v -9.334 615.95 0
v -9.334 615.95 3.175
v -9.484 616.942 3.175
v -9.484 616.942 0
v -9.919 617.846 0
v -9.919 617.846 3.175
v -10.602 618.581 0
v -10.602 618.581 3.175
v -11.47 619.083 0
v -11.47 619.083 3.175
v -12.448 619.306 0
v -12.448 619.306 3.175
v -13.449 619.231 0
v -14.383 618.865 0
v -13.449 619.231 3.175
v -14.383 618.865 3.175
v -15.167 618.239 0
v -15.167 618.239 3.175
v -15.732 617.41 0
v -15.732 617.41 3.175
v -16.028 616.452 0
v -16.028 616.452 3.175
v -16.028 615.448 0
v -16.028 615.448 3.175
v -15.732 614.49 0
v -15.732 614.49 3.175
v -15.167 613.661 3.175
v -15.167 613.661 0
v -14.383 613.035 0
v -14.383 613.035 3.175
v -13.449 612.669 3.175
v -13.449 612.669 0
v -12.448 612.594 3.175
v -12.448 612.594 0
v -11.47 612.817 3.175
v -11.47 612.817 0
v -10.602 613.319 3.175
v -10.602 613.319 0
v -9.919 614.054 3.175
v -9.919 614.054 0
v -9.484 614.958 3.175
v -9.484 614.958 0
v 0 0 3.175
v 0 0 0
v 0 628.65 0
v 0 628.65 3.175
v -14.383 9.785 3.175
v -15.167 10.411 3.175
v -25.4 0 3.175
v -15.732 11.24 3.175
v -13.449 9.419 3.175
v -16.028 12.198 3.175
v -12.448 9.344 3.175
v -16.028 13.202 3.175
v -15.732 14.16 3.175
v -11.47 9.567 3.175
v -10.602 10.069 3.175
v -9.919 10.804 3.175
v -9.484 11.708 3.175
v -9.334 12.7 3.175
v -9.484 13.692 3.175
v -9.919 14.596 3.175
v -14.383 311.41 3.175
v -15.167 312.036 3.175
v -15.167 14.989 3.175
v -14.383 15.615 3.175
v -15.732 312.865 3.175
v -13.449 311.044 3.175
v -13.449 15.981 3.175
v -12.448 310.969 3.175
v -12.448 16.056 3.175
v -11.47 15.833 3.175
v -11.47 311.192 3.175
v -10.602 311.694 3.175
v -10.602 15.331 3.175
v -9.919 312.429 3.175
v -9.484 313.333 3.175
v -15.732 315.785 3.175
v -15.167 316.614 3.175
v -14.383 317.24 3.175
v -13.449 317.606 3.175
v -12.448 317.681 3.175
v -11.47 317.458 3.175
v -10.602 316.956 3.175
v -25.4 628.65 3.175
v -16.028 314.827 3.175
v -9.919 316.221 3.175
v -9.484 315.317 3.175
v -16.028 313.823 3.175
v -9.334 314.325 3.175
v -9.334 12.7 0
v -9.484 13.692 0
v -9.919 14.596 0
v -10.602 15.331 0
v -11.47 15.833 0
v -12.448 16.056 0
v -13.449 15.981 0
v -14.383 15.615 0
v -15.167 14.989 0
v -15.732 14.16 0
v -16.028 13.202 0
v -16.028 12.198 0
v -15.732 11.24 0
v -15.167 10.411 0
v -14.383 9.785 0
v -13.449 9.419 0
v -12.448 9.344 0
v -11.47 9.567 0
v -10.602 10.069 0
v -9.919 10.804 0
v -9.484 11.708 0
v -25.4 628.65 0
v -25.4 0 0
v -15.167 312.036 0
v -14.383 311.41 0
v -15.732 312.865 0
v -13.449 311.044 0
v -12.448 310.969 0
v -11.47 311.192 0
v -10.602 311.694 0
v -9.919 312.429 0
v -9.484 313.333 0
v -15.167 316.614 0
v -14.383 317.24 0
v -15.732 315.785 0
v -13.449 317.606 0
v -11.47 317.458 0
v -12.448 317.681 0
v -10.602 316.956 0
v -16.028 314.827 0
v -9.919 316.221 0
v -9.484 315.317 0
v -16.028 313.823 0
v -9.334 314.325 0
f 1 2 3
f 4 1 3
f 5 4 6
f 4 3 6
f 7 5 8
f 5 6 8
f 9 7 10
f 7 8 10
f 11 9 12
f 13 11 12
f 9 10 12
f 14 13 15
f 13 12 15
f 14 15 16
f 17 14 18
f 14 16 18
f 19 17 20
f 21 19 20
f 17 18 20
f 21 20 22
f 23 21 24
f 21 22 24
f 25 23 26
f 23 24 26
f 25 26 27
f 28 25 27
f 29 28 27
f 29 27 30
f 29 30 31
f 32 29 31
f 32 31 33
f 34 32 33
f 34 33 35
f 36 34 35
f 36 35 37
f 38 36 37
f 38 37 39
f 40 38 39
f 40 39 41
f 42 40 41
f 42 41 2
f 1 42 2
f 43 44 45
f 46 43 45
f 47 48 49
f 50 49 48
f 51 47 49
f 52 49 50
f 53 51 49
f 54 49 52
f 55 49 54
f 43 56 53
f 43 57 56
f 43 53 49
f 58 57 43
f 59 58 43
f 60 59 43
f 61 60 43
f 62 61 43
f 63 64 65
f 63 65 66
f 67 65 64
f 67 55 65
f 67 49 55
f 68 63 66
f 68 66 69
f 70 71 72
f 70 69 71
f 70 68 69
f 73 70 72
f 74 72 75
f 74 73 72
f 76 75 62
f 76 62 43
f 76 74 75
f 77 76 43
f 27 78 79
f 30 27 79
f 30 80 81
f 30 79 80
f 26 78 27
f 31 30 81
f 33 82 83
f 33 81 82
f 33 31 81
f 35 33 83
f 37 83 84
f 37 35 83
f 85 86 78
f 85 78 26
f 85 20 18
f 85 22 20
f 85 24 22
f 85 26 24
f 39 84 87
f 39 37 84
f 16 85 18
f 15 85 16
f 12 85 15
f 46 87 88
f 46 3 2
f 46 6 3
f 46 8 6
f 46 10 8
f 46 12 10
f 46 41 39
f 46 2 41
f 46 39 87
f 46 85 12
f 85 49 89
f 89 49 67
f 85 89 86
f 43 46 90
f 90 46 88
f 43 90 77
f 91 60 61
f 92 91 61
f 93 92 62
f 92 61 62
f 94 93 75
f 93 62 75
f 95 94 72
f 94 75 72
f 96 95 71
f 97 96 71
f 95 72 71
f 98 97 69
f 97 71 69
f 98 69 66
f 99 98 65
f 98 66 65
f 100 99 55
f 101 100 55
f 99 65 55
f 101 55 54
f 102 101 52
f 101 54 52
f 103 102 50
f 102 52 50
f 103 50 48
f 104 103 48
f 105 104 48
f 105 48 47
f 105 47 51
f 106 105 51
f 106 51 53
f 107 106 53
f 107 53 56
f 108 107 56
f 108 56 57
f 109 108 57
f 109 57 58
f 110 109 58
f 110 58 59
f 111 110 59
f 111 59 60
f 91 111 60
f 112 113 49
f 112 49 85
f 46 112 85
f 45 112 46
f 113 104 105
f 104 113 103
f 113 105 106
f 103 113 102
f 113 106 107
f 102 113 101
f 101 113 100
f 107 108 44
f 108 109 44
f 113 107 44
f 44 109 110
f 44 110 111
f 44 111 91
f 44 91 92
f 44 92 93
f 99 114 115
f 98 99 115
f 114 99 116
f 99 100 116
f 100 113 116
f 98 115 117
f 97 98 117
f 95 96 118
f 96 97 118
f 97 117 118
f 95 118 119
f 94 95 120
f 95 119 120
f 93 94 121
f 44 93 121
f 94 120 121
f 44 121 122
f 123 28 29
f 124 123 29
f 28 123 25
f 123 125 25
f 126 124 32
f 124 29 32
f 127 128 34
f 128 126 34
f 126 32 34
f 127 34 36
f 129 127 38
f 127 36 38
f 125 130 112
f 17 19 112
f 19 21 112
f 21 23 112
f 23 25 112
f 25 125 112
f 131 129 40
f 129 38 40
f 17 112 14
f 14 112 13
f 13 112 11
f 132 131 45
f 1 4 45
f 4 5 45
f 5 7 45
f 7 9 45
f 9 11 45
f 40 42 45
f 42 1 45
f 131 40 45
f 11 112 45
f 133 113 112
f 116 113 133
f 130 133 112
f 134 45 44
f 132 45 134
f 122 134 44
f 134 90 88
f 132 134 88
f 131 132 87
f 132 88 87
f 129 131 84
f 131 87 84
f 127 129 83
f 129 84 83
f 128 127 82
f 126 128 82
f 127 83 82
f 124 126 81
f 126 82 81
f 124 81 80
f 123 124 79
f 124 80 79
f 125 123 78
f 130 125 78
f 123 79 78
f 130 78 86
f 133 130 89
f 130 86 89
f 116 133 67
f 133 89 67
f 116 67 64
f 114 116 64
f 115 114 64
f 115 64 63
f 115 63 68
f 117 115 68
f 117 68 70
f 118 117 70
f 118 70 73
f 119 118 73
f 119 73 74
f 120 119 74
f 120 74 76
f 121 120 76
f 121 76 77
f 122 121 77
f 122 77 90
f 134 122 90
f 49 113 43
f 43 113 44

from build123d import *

# Parameters (mm, degrees)
SKETCH1_W           = 25.4
SKETCH1_H           = 628.65
BOSS_EXTRUDE1_DEPTH = 3.175
SKETCH2_R           = 3.3655
CUT_EXTRUDE1_DEPTH  = 4.175
LPATTERN1_COUNT     = 3
LPATTERN1_PITCH     = 301.625


with BuildPart() as part:
    # Sketch1 → Boss-Extrude1 (new body)
    with BuildSketch(Plane.XY):
        with Locations((-12.7, 314.325)):
            Rectangle(SKETCH1_W, SKETCH1_H)
    extrude(amount=BOSS_EXTRUDE1_DEPTH)

    # Sketch2 → Cut-Extrude1 (cut, through all)
    with BuildSketch(Plane.XY.offset(3.175)):
        with Locations((-12.7, 12.7)):
            Circle(SKETCH2_R)
    cut_extrude1 = extrude(amount=-CUT_EXTRUDE1_DEPTH, mode=Mode.SUBTRACT)

    # LPattern1: Cut-Extrude1 ×3
    with Locations(*[(0, i * LPATTERN1_PITCH, 0) for i in range(1, LPATTERN1_COUNT)]):
        add(cut_extrude1, mode=Mode.SUBTRACT)


solid = part.part
